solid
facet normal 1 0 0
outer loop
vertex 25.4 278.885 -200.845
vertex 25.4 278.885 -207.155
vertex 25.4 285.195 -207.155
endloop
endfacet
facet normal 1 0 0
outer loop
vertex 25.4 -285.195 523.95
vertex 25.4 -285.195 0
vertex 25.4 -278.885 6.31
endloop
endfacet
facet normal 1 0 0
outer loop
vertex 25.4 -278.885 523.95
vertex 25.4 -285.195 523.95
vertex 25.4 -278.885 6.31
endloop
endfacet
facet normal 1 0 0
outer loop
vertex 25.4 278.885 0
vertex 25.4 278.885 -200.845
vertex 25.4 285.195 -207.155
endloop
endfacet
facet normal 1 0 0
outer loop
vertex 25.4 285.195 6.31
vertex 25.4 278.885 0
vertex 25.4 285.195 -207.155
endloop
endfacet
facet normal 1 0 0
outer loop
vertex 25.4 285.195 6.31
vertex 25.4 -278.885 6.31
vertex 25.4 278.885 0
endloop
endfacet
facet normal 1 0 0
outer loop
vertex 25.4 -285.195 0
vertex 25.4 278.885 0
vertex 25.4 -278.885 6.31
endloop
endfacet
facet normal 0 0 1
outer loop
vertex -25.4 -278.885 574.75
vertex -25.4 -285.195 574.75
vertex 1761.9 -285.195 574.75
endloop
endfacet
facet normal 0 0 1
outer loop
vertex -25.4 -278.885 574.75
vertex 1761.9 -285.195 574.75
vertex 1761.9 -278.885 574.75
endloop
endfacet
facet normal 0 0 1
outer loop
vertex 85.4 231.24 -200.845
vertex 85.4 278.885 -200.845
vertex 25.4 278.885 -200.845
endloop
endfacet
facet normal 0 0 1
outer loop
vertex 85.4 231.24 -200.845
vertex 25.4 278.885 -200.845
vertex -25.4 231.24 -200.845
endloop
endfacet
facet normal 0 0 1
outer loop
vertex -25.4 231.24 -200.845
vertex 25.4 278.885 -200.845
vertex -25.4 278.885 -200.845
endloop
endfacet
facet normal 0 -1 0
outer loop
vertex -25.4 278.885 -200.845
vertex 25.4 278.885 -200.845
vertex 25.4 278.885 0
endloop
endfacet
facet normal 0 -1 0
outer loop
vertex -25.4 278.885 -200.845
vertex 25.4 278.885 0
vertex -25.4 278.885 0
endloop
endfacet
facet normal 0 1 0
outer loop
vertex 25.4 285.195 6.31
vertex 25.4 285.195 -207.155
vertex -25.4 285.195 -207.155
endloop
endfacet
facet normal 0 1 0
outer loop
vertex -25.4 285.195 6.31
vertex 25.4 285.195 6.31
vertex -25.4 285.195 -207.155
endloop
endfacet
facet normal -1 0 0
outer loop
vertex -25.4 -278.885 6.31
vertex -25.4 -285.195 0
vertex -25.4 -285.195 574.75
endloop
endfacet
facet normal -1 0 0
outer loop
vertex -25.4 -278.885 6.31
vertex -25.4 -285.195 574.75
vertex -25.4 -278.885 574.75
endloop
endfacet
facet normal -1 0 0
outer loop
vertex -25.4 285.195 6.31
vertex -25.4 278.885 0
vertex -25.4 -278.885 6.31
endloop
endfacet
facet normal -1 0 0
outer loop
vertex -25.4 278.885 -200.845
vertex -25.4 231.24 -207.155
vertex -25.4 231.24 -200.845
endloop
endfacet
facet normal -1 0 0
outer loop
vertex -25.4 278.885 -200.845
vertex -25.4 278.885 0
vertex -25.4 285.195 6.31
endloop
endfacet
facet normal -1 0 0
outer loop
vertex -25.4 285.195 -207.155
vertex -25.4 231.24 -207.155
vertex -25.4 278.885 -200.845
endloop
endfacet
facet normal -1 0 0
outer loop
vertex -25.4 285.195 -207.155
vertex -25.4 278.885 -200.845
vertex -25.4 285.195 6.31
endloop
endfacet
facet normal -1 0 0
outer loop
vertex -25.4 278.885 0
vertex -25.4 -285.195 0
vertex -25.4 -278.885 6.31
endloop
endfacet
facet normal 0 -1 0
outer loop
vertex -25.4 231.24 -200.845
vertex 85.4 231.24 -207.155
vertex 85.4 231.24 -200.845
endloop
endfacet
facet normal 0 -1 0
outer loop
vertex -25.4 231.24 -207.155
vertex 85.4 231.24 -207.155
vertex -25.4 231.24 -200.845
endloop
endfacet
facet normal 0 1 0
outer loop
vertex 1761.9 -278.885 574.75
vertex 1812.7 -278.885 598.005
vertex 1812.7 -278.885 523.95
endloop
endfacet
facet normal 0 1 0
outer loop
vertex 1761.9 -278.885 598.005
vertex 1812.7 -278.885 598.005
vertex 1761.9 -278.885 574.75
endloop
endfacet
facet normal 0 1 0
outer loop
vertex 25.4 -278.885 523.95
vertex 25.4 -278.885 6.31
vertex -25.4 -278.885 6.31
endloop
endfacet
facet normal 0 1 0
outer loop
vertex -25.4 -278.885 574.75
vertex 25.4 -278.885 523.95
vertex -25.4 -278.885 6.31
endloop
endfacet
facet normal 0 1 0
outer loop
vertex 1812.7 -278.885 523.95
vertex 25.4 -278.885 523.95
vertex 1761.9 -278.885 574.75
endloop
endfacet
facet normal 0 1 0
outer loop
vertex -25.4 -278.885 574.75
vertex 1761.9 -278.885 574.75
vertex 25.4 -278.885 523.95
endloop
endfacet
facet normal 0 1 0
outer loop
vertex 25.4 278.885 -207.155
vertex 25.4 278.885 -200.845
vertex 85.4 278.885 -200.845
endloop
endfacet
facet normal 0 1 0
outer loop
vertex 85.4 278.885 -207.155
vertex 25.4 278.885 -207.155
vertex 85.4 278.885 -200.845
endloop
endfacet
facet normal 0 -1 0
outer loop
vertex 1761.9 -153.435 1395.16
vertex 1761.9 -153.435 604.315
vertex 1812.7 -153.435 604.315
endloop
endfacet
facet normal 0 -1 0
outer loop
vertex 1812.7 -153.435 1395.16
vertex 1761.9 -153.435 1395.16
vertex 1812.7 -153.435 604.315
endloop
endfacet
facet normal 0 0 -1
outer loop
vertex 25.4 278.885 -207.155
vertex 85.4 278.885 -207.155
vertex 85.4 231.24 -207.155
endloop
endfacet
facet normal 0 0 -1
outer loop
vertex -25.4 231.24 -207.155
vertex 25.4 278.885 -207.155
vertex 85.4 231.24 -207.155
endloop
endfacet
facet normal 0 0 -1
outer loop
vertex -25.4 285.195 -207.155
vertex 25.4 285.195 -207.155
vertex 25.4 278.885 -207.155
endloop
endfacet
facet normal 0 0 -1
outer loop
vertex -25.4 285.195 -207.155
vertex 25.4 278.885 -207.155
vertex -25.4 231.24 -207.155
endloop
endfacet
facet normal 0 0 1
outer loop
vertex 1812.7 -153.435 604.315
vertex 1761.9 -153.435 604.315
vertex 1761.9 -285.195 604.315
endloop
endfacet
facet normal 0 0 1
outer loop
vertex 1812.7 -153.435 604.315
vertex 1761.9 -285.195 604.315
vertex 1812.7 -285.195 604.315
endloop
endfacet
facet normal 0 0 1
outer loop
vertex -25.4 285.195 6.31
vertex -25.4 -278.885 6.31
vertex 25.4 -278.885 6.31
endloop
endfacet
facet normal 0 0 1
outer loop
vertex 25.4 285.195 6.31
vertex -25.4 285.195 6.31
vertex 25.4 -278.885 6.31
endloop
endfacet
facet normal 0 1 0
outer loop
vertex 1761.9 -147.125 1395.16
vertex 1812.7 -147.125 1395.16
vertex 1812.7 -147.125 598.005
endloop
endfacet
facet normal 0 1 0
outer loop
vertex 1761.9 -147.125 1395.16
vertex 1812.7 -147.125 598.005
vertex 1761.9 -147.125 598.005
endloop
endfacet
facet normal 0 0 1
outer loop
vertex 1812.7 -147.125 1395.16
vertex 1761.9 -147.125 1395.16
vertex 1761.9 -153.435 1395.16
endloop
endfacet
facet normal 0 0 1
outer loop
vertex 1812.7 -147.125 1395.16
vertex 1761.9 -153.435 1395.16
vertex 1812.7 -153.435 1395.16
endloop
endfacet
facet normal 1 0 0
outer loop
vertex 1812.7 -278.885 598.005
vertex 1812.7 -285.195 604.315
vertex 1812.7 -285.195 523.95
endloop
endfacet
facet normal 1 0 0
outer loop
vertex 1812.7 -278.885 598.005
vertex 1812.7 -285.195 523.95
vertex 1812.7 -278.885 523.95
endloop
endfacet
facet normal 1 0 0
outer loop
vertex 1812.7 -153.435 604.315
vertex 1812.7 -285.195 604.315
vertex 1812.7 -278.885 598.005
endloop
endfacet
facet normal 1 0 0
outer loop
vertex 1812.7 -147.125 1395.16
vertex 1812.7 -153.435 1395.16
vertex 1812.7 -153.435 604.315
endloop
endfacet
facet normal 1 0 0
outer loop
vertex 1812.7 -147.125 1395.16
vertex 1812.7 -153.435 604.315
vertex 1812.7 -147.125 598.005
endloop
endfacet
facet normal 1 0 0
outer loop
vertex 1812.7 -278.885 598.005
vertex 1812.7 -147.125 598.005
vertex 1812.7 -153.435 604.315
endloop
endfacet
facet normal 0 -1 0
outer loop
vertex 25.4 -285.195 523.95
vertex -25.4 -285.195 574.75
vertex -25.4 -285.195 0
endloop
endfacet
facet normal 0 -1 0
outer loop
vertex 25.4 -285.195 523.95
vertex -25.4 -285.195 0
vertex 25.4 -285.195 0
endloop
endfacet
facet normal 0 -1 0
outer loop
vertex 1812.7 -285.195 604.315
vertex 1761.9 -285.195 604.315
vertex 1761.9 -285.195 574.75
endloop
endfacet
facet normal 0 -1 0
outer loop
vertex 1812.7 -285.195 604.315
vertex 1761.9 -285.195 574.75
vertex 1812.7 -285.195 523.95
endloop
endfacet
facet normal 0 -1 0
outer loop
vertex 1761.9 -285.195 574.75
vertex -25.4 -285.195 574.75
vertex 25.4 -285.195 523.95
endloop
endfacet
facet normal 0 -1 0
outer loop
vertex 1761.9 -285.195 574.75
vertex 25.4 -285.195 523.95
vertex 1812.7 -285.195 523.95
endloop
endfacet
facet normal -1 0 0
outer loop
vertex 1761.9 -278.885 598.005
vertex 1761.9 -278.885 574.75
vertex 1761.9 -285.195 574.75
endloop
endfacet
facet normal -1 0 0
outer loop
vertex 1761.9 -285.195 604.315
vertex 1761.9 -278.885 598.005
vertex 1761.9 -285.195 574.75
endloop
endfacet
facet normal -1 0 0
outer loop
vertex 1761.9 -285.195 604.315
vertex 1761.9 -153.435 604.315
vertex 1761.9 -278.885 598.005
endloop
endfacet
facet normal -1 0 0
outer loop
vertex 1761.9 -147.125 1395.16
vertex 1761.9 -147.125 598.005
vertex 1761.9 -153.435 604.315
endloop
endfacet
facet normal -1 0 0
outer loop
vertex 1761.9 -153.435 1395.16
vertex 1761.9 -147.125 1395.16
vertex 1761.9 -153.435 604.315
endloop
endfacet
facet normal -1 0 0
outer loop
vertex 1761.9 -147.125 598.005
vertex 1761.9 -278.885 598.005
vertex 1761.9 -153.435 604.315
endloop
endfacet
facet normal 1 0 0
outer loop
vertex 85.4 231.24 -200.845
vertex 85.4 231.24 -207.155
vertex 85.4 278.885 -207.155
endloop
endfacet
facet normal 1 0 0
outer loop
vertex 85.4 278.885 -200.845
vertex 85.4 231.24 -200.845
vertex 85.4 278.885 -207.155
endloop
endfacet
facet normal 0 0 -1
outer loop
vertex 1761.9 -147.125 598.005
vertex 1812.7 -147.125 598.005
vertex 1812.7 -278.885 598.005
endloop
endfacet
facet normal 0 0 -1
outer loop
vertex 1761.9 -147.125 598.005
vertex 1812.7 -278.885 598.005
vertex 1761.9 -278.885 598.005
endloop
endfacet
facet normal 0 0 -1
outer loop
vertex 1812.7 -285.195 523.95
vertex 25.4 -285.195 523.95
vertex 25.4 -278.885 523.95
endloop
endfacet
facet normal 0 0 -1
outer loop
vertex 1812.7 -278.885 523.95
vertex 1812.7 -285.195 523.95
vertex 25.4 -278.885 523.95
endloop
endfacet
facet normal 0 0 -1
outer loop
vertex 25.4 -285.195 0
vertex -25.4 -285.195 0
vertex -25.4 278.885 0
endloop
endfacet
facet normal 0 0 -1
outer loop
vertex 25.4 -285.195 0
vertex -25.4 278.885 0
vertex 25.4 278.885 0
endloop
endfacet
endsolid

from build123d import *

# Parameters (mm, degrees)
CROQUIS2_W              = 50.8
CROQUIS2_H              = 570.39
SALIENTE_EXTRUIR1_DEPTH = 6.31
CROQUIS3_W              = 50.8
CROQUIS3_H              = 6.31
SALIENTE_EXTRUIR2_DEPTH = 568.44
CROQUIS4_W              = 50.8
CROQUIS4_H              = 6.31
SALIENTE_EXTRUIR3_DEPTH = 1787.3
CROQUIS6_W              = 50.8
CROQUIS6_H              = 6.31
CROQUIS7_W              = 60
CROQUIS7_H              = 53.955
SALIENTE_EXTRUIR4_DEPTH = 6.31
CROQUIS8_W              = 60
CROQUIS8_H              = 6.31
CORTAR_EXTRUIR1_DEPTH   = 6.31
CROQUIS9_W              = 50.8
CROQUIS9_H              = 6.31


with BuildPart() as part:
    # Croquis2 → Saliente-Extruir1 (new body)
    with BuildSketch(Plane.XY):
        Rectangle(CROQUIS2_W, CROQUIS2_H)
    extrude(amount=SALIENTE_EXTRUIR1_DEPTH)

    # Croquis3 → Saliente-Extruir2 (add)
    with BuildSketch(Plane.XY.offset(6.31)):
        with Locations((0, -282.04)):
            Rectangle(CROQUIS3_W, CROQUIS3_H)
    extrude(amount=SALIENTE_EXTRUIR2_DEPTH)

    # Croquis4 → Saliente-Extruir3 (add)
    with BuildSketch(Plane(origin=(25.4, 0, 0), x_dir=(0, 0, -1), z_dir=(1, 0, 0))):
        with Locations((-549.35, -282.04)):
            Rectangle(CROQUIS4_W, CROQUIS4_H)
    extrude(amount=SALIENTE_EXTRUIR3_DEPTH)

    # Barrer1: sweep along a curve in space
    with BuildLine() as barrer1_path:
        Line((0, 282.04, 0), (0, 282.04, -204))
        Line((0, 282.04, -204), (0, 231.24, -204))
    # Croquis6 → Barrer1 (sweep)
    with BuildSketch(Plane(origin=(0, 0, 0), x_dir=(-1, 0, 0), z_dir=(0, 0, -1))):
        with Locations((0, 282.04)):
            Rectangle(CROQUIS6_W, CROQUIS6_H)
    sweep(path=barrer1_path.line, transition=Transition.RIGHT)

    # Croquis7 → Saliente-Extruir4 (add)
    with BuildSketch(Plane(origin=(0, 0, -207.155), x_dir=(-1, 0, 0), z_dir=(0, 0, -1))):
        with Locations((-55.4, 258.2175)):
            Rectangle(CROQUIS7_W, CROQUIS7_H)
    extrude(amount=-SALIENTE_EXTRUIR4_DEPTH)

    # Croquis8 → Cortar-Extruir1 (cut)
    with BuildSketch(Plane.XY.offset(-200.845)):
        with Locations((55.4, 282.04)):
            Rectangle(CROQUIS8_W, CROQUIS8_H)
    extrude(amount=-CORTAR_EXTRUIR1_DEPTH, mode=Mode.SUBTRACT)

    # Barrer2: sweep along a curve in space
    with BuildLine() as barrer2_path:
        Line((1787.3, -282.04, 574.75), (1787.3, -282.04, 601.16))
        Line((1787.3, -282.04, 601.16), (1787.3, -150.28, 601.16))
        Line((1787.3, -150.28, 601.16), (1787.3, -150.28, 1395.16))
    # Croquis9 → Barrer2 (sweep)
    with BuildSketch(Plane.XY.offset(574.75)):
        with Locations((1787.3, -282.04)):
            Rectangle(CROQUIS9_W, CROQUIS9_H)
    sweep(path=barrer2_path.line, transition=Transition.RIGHT)


solid = part.part
